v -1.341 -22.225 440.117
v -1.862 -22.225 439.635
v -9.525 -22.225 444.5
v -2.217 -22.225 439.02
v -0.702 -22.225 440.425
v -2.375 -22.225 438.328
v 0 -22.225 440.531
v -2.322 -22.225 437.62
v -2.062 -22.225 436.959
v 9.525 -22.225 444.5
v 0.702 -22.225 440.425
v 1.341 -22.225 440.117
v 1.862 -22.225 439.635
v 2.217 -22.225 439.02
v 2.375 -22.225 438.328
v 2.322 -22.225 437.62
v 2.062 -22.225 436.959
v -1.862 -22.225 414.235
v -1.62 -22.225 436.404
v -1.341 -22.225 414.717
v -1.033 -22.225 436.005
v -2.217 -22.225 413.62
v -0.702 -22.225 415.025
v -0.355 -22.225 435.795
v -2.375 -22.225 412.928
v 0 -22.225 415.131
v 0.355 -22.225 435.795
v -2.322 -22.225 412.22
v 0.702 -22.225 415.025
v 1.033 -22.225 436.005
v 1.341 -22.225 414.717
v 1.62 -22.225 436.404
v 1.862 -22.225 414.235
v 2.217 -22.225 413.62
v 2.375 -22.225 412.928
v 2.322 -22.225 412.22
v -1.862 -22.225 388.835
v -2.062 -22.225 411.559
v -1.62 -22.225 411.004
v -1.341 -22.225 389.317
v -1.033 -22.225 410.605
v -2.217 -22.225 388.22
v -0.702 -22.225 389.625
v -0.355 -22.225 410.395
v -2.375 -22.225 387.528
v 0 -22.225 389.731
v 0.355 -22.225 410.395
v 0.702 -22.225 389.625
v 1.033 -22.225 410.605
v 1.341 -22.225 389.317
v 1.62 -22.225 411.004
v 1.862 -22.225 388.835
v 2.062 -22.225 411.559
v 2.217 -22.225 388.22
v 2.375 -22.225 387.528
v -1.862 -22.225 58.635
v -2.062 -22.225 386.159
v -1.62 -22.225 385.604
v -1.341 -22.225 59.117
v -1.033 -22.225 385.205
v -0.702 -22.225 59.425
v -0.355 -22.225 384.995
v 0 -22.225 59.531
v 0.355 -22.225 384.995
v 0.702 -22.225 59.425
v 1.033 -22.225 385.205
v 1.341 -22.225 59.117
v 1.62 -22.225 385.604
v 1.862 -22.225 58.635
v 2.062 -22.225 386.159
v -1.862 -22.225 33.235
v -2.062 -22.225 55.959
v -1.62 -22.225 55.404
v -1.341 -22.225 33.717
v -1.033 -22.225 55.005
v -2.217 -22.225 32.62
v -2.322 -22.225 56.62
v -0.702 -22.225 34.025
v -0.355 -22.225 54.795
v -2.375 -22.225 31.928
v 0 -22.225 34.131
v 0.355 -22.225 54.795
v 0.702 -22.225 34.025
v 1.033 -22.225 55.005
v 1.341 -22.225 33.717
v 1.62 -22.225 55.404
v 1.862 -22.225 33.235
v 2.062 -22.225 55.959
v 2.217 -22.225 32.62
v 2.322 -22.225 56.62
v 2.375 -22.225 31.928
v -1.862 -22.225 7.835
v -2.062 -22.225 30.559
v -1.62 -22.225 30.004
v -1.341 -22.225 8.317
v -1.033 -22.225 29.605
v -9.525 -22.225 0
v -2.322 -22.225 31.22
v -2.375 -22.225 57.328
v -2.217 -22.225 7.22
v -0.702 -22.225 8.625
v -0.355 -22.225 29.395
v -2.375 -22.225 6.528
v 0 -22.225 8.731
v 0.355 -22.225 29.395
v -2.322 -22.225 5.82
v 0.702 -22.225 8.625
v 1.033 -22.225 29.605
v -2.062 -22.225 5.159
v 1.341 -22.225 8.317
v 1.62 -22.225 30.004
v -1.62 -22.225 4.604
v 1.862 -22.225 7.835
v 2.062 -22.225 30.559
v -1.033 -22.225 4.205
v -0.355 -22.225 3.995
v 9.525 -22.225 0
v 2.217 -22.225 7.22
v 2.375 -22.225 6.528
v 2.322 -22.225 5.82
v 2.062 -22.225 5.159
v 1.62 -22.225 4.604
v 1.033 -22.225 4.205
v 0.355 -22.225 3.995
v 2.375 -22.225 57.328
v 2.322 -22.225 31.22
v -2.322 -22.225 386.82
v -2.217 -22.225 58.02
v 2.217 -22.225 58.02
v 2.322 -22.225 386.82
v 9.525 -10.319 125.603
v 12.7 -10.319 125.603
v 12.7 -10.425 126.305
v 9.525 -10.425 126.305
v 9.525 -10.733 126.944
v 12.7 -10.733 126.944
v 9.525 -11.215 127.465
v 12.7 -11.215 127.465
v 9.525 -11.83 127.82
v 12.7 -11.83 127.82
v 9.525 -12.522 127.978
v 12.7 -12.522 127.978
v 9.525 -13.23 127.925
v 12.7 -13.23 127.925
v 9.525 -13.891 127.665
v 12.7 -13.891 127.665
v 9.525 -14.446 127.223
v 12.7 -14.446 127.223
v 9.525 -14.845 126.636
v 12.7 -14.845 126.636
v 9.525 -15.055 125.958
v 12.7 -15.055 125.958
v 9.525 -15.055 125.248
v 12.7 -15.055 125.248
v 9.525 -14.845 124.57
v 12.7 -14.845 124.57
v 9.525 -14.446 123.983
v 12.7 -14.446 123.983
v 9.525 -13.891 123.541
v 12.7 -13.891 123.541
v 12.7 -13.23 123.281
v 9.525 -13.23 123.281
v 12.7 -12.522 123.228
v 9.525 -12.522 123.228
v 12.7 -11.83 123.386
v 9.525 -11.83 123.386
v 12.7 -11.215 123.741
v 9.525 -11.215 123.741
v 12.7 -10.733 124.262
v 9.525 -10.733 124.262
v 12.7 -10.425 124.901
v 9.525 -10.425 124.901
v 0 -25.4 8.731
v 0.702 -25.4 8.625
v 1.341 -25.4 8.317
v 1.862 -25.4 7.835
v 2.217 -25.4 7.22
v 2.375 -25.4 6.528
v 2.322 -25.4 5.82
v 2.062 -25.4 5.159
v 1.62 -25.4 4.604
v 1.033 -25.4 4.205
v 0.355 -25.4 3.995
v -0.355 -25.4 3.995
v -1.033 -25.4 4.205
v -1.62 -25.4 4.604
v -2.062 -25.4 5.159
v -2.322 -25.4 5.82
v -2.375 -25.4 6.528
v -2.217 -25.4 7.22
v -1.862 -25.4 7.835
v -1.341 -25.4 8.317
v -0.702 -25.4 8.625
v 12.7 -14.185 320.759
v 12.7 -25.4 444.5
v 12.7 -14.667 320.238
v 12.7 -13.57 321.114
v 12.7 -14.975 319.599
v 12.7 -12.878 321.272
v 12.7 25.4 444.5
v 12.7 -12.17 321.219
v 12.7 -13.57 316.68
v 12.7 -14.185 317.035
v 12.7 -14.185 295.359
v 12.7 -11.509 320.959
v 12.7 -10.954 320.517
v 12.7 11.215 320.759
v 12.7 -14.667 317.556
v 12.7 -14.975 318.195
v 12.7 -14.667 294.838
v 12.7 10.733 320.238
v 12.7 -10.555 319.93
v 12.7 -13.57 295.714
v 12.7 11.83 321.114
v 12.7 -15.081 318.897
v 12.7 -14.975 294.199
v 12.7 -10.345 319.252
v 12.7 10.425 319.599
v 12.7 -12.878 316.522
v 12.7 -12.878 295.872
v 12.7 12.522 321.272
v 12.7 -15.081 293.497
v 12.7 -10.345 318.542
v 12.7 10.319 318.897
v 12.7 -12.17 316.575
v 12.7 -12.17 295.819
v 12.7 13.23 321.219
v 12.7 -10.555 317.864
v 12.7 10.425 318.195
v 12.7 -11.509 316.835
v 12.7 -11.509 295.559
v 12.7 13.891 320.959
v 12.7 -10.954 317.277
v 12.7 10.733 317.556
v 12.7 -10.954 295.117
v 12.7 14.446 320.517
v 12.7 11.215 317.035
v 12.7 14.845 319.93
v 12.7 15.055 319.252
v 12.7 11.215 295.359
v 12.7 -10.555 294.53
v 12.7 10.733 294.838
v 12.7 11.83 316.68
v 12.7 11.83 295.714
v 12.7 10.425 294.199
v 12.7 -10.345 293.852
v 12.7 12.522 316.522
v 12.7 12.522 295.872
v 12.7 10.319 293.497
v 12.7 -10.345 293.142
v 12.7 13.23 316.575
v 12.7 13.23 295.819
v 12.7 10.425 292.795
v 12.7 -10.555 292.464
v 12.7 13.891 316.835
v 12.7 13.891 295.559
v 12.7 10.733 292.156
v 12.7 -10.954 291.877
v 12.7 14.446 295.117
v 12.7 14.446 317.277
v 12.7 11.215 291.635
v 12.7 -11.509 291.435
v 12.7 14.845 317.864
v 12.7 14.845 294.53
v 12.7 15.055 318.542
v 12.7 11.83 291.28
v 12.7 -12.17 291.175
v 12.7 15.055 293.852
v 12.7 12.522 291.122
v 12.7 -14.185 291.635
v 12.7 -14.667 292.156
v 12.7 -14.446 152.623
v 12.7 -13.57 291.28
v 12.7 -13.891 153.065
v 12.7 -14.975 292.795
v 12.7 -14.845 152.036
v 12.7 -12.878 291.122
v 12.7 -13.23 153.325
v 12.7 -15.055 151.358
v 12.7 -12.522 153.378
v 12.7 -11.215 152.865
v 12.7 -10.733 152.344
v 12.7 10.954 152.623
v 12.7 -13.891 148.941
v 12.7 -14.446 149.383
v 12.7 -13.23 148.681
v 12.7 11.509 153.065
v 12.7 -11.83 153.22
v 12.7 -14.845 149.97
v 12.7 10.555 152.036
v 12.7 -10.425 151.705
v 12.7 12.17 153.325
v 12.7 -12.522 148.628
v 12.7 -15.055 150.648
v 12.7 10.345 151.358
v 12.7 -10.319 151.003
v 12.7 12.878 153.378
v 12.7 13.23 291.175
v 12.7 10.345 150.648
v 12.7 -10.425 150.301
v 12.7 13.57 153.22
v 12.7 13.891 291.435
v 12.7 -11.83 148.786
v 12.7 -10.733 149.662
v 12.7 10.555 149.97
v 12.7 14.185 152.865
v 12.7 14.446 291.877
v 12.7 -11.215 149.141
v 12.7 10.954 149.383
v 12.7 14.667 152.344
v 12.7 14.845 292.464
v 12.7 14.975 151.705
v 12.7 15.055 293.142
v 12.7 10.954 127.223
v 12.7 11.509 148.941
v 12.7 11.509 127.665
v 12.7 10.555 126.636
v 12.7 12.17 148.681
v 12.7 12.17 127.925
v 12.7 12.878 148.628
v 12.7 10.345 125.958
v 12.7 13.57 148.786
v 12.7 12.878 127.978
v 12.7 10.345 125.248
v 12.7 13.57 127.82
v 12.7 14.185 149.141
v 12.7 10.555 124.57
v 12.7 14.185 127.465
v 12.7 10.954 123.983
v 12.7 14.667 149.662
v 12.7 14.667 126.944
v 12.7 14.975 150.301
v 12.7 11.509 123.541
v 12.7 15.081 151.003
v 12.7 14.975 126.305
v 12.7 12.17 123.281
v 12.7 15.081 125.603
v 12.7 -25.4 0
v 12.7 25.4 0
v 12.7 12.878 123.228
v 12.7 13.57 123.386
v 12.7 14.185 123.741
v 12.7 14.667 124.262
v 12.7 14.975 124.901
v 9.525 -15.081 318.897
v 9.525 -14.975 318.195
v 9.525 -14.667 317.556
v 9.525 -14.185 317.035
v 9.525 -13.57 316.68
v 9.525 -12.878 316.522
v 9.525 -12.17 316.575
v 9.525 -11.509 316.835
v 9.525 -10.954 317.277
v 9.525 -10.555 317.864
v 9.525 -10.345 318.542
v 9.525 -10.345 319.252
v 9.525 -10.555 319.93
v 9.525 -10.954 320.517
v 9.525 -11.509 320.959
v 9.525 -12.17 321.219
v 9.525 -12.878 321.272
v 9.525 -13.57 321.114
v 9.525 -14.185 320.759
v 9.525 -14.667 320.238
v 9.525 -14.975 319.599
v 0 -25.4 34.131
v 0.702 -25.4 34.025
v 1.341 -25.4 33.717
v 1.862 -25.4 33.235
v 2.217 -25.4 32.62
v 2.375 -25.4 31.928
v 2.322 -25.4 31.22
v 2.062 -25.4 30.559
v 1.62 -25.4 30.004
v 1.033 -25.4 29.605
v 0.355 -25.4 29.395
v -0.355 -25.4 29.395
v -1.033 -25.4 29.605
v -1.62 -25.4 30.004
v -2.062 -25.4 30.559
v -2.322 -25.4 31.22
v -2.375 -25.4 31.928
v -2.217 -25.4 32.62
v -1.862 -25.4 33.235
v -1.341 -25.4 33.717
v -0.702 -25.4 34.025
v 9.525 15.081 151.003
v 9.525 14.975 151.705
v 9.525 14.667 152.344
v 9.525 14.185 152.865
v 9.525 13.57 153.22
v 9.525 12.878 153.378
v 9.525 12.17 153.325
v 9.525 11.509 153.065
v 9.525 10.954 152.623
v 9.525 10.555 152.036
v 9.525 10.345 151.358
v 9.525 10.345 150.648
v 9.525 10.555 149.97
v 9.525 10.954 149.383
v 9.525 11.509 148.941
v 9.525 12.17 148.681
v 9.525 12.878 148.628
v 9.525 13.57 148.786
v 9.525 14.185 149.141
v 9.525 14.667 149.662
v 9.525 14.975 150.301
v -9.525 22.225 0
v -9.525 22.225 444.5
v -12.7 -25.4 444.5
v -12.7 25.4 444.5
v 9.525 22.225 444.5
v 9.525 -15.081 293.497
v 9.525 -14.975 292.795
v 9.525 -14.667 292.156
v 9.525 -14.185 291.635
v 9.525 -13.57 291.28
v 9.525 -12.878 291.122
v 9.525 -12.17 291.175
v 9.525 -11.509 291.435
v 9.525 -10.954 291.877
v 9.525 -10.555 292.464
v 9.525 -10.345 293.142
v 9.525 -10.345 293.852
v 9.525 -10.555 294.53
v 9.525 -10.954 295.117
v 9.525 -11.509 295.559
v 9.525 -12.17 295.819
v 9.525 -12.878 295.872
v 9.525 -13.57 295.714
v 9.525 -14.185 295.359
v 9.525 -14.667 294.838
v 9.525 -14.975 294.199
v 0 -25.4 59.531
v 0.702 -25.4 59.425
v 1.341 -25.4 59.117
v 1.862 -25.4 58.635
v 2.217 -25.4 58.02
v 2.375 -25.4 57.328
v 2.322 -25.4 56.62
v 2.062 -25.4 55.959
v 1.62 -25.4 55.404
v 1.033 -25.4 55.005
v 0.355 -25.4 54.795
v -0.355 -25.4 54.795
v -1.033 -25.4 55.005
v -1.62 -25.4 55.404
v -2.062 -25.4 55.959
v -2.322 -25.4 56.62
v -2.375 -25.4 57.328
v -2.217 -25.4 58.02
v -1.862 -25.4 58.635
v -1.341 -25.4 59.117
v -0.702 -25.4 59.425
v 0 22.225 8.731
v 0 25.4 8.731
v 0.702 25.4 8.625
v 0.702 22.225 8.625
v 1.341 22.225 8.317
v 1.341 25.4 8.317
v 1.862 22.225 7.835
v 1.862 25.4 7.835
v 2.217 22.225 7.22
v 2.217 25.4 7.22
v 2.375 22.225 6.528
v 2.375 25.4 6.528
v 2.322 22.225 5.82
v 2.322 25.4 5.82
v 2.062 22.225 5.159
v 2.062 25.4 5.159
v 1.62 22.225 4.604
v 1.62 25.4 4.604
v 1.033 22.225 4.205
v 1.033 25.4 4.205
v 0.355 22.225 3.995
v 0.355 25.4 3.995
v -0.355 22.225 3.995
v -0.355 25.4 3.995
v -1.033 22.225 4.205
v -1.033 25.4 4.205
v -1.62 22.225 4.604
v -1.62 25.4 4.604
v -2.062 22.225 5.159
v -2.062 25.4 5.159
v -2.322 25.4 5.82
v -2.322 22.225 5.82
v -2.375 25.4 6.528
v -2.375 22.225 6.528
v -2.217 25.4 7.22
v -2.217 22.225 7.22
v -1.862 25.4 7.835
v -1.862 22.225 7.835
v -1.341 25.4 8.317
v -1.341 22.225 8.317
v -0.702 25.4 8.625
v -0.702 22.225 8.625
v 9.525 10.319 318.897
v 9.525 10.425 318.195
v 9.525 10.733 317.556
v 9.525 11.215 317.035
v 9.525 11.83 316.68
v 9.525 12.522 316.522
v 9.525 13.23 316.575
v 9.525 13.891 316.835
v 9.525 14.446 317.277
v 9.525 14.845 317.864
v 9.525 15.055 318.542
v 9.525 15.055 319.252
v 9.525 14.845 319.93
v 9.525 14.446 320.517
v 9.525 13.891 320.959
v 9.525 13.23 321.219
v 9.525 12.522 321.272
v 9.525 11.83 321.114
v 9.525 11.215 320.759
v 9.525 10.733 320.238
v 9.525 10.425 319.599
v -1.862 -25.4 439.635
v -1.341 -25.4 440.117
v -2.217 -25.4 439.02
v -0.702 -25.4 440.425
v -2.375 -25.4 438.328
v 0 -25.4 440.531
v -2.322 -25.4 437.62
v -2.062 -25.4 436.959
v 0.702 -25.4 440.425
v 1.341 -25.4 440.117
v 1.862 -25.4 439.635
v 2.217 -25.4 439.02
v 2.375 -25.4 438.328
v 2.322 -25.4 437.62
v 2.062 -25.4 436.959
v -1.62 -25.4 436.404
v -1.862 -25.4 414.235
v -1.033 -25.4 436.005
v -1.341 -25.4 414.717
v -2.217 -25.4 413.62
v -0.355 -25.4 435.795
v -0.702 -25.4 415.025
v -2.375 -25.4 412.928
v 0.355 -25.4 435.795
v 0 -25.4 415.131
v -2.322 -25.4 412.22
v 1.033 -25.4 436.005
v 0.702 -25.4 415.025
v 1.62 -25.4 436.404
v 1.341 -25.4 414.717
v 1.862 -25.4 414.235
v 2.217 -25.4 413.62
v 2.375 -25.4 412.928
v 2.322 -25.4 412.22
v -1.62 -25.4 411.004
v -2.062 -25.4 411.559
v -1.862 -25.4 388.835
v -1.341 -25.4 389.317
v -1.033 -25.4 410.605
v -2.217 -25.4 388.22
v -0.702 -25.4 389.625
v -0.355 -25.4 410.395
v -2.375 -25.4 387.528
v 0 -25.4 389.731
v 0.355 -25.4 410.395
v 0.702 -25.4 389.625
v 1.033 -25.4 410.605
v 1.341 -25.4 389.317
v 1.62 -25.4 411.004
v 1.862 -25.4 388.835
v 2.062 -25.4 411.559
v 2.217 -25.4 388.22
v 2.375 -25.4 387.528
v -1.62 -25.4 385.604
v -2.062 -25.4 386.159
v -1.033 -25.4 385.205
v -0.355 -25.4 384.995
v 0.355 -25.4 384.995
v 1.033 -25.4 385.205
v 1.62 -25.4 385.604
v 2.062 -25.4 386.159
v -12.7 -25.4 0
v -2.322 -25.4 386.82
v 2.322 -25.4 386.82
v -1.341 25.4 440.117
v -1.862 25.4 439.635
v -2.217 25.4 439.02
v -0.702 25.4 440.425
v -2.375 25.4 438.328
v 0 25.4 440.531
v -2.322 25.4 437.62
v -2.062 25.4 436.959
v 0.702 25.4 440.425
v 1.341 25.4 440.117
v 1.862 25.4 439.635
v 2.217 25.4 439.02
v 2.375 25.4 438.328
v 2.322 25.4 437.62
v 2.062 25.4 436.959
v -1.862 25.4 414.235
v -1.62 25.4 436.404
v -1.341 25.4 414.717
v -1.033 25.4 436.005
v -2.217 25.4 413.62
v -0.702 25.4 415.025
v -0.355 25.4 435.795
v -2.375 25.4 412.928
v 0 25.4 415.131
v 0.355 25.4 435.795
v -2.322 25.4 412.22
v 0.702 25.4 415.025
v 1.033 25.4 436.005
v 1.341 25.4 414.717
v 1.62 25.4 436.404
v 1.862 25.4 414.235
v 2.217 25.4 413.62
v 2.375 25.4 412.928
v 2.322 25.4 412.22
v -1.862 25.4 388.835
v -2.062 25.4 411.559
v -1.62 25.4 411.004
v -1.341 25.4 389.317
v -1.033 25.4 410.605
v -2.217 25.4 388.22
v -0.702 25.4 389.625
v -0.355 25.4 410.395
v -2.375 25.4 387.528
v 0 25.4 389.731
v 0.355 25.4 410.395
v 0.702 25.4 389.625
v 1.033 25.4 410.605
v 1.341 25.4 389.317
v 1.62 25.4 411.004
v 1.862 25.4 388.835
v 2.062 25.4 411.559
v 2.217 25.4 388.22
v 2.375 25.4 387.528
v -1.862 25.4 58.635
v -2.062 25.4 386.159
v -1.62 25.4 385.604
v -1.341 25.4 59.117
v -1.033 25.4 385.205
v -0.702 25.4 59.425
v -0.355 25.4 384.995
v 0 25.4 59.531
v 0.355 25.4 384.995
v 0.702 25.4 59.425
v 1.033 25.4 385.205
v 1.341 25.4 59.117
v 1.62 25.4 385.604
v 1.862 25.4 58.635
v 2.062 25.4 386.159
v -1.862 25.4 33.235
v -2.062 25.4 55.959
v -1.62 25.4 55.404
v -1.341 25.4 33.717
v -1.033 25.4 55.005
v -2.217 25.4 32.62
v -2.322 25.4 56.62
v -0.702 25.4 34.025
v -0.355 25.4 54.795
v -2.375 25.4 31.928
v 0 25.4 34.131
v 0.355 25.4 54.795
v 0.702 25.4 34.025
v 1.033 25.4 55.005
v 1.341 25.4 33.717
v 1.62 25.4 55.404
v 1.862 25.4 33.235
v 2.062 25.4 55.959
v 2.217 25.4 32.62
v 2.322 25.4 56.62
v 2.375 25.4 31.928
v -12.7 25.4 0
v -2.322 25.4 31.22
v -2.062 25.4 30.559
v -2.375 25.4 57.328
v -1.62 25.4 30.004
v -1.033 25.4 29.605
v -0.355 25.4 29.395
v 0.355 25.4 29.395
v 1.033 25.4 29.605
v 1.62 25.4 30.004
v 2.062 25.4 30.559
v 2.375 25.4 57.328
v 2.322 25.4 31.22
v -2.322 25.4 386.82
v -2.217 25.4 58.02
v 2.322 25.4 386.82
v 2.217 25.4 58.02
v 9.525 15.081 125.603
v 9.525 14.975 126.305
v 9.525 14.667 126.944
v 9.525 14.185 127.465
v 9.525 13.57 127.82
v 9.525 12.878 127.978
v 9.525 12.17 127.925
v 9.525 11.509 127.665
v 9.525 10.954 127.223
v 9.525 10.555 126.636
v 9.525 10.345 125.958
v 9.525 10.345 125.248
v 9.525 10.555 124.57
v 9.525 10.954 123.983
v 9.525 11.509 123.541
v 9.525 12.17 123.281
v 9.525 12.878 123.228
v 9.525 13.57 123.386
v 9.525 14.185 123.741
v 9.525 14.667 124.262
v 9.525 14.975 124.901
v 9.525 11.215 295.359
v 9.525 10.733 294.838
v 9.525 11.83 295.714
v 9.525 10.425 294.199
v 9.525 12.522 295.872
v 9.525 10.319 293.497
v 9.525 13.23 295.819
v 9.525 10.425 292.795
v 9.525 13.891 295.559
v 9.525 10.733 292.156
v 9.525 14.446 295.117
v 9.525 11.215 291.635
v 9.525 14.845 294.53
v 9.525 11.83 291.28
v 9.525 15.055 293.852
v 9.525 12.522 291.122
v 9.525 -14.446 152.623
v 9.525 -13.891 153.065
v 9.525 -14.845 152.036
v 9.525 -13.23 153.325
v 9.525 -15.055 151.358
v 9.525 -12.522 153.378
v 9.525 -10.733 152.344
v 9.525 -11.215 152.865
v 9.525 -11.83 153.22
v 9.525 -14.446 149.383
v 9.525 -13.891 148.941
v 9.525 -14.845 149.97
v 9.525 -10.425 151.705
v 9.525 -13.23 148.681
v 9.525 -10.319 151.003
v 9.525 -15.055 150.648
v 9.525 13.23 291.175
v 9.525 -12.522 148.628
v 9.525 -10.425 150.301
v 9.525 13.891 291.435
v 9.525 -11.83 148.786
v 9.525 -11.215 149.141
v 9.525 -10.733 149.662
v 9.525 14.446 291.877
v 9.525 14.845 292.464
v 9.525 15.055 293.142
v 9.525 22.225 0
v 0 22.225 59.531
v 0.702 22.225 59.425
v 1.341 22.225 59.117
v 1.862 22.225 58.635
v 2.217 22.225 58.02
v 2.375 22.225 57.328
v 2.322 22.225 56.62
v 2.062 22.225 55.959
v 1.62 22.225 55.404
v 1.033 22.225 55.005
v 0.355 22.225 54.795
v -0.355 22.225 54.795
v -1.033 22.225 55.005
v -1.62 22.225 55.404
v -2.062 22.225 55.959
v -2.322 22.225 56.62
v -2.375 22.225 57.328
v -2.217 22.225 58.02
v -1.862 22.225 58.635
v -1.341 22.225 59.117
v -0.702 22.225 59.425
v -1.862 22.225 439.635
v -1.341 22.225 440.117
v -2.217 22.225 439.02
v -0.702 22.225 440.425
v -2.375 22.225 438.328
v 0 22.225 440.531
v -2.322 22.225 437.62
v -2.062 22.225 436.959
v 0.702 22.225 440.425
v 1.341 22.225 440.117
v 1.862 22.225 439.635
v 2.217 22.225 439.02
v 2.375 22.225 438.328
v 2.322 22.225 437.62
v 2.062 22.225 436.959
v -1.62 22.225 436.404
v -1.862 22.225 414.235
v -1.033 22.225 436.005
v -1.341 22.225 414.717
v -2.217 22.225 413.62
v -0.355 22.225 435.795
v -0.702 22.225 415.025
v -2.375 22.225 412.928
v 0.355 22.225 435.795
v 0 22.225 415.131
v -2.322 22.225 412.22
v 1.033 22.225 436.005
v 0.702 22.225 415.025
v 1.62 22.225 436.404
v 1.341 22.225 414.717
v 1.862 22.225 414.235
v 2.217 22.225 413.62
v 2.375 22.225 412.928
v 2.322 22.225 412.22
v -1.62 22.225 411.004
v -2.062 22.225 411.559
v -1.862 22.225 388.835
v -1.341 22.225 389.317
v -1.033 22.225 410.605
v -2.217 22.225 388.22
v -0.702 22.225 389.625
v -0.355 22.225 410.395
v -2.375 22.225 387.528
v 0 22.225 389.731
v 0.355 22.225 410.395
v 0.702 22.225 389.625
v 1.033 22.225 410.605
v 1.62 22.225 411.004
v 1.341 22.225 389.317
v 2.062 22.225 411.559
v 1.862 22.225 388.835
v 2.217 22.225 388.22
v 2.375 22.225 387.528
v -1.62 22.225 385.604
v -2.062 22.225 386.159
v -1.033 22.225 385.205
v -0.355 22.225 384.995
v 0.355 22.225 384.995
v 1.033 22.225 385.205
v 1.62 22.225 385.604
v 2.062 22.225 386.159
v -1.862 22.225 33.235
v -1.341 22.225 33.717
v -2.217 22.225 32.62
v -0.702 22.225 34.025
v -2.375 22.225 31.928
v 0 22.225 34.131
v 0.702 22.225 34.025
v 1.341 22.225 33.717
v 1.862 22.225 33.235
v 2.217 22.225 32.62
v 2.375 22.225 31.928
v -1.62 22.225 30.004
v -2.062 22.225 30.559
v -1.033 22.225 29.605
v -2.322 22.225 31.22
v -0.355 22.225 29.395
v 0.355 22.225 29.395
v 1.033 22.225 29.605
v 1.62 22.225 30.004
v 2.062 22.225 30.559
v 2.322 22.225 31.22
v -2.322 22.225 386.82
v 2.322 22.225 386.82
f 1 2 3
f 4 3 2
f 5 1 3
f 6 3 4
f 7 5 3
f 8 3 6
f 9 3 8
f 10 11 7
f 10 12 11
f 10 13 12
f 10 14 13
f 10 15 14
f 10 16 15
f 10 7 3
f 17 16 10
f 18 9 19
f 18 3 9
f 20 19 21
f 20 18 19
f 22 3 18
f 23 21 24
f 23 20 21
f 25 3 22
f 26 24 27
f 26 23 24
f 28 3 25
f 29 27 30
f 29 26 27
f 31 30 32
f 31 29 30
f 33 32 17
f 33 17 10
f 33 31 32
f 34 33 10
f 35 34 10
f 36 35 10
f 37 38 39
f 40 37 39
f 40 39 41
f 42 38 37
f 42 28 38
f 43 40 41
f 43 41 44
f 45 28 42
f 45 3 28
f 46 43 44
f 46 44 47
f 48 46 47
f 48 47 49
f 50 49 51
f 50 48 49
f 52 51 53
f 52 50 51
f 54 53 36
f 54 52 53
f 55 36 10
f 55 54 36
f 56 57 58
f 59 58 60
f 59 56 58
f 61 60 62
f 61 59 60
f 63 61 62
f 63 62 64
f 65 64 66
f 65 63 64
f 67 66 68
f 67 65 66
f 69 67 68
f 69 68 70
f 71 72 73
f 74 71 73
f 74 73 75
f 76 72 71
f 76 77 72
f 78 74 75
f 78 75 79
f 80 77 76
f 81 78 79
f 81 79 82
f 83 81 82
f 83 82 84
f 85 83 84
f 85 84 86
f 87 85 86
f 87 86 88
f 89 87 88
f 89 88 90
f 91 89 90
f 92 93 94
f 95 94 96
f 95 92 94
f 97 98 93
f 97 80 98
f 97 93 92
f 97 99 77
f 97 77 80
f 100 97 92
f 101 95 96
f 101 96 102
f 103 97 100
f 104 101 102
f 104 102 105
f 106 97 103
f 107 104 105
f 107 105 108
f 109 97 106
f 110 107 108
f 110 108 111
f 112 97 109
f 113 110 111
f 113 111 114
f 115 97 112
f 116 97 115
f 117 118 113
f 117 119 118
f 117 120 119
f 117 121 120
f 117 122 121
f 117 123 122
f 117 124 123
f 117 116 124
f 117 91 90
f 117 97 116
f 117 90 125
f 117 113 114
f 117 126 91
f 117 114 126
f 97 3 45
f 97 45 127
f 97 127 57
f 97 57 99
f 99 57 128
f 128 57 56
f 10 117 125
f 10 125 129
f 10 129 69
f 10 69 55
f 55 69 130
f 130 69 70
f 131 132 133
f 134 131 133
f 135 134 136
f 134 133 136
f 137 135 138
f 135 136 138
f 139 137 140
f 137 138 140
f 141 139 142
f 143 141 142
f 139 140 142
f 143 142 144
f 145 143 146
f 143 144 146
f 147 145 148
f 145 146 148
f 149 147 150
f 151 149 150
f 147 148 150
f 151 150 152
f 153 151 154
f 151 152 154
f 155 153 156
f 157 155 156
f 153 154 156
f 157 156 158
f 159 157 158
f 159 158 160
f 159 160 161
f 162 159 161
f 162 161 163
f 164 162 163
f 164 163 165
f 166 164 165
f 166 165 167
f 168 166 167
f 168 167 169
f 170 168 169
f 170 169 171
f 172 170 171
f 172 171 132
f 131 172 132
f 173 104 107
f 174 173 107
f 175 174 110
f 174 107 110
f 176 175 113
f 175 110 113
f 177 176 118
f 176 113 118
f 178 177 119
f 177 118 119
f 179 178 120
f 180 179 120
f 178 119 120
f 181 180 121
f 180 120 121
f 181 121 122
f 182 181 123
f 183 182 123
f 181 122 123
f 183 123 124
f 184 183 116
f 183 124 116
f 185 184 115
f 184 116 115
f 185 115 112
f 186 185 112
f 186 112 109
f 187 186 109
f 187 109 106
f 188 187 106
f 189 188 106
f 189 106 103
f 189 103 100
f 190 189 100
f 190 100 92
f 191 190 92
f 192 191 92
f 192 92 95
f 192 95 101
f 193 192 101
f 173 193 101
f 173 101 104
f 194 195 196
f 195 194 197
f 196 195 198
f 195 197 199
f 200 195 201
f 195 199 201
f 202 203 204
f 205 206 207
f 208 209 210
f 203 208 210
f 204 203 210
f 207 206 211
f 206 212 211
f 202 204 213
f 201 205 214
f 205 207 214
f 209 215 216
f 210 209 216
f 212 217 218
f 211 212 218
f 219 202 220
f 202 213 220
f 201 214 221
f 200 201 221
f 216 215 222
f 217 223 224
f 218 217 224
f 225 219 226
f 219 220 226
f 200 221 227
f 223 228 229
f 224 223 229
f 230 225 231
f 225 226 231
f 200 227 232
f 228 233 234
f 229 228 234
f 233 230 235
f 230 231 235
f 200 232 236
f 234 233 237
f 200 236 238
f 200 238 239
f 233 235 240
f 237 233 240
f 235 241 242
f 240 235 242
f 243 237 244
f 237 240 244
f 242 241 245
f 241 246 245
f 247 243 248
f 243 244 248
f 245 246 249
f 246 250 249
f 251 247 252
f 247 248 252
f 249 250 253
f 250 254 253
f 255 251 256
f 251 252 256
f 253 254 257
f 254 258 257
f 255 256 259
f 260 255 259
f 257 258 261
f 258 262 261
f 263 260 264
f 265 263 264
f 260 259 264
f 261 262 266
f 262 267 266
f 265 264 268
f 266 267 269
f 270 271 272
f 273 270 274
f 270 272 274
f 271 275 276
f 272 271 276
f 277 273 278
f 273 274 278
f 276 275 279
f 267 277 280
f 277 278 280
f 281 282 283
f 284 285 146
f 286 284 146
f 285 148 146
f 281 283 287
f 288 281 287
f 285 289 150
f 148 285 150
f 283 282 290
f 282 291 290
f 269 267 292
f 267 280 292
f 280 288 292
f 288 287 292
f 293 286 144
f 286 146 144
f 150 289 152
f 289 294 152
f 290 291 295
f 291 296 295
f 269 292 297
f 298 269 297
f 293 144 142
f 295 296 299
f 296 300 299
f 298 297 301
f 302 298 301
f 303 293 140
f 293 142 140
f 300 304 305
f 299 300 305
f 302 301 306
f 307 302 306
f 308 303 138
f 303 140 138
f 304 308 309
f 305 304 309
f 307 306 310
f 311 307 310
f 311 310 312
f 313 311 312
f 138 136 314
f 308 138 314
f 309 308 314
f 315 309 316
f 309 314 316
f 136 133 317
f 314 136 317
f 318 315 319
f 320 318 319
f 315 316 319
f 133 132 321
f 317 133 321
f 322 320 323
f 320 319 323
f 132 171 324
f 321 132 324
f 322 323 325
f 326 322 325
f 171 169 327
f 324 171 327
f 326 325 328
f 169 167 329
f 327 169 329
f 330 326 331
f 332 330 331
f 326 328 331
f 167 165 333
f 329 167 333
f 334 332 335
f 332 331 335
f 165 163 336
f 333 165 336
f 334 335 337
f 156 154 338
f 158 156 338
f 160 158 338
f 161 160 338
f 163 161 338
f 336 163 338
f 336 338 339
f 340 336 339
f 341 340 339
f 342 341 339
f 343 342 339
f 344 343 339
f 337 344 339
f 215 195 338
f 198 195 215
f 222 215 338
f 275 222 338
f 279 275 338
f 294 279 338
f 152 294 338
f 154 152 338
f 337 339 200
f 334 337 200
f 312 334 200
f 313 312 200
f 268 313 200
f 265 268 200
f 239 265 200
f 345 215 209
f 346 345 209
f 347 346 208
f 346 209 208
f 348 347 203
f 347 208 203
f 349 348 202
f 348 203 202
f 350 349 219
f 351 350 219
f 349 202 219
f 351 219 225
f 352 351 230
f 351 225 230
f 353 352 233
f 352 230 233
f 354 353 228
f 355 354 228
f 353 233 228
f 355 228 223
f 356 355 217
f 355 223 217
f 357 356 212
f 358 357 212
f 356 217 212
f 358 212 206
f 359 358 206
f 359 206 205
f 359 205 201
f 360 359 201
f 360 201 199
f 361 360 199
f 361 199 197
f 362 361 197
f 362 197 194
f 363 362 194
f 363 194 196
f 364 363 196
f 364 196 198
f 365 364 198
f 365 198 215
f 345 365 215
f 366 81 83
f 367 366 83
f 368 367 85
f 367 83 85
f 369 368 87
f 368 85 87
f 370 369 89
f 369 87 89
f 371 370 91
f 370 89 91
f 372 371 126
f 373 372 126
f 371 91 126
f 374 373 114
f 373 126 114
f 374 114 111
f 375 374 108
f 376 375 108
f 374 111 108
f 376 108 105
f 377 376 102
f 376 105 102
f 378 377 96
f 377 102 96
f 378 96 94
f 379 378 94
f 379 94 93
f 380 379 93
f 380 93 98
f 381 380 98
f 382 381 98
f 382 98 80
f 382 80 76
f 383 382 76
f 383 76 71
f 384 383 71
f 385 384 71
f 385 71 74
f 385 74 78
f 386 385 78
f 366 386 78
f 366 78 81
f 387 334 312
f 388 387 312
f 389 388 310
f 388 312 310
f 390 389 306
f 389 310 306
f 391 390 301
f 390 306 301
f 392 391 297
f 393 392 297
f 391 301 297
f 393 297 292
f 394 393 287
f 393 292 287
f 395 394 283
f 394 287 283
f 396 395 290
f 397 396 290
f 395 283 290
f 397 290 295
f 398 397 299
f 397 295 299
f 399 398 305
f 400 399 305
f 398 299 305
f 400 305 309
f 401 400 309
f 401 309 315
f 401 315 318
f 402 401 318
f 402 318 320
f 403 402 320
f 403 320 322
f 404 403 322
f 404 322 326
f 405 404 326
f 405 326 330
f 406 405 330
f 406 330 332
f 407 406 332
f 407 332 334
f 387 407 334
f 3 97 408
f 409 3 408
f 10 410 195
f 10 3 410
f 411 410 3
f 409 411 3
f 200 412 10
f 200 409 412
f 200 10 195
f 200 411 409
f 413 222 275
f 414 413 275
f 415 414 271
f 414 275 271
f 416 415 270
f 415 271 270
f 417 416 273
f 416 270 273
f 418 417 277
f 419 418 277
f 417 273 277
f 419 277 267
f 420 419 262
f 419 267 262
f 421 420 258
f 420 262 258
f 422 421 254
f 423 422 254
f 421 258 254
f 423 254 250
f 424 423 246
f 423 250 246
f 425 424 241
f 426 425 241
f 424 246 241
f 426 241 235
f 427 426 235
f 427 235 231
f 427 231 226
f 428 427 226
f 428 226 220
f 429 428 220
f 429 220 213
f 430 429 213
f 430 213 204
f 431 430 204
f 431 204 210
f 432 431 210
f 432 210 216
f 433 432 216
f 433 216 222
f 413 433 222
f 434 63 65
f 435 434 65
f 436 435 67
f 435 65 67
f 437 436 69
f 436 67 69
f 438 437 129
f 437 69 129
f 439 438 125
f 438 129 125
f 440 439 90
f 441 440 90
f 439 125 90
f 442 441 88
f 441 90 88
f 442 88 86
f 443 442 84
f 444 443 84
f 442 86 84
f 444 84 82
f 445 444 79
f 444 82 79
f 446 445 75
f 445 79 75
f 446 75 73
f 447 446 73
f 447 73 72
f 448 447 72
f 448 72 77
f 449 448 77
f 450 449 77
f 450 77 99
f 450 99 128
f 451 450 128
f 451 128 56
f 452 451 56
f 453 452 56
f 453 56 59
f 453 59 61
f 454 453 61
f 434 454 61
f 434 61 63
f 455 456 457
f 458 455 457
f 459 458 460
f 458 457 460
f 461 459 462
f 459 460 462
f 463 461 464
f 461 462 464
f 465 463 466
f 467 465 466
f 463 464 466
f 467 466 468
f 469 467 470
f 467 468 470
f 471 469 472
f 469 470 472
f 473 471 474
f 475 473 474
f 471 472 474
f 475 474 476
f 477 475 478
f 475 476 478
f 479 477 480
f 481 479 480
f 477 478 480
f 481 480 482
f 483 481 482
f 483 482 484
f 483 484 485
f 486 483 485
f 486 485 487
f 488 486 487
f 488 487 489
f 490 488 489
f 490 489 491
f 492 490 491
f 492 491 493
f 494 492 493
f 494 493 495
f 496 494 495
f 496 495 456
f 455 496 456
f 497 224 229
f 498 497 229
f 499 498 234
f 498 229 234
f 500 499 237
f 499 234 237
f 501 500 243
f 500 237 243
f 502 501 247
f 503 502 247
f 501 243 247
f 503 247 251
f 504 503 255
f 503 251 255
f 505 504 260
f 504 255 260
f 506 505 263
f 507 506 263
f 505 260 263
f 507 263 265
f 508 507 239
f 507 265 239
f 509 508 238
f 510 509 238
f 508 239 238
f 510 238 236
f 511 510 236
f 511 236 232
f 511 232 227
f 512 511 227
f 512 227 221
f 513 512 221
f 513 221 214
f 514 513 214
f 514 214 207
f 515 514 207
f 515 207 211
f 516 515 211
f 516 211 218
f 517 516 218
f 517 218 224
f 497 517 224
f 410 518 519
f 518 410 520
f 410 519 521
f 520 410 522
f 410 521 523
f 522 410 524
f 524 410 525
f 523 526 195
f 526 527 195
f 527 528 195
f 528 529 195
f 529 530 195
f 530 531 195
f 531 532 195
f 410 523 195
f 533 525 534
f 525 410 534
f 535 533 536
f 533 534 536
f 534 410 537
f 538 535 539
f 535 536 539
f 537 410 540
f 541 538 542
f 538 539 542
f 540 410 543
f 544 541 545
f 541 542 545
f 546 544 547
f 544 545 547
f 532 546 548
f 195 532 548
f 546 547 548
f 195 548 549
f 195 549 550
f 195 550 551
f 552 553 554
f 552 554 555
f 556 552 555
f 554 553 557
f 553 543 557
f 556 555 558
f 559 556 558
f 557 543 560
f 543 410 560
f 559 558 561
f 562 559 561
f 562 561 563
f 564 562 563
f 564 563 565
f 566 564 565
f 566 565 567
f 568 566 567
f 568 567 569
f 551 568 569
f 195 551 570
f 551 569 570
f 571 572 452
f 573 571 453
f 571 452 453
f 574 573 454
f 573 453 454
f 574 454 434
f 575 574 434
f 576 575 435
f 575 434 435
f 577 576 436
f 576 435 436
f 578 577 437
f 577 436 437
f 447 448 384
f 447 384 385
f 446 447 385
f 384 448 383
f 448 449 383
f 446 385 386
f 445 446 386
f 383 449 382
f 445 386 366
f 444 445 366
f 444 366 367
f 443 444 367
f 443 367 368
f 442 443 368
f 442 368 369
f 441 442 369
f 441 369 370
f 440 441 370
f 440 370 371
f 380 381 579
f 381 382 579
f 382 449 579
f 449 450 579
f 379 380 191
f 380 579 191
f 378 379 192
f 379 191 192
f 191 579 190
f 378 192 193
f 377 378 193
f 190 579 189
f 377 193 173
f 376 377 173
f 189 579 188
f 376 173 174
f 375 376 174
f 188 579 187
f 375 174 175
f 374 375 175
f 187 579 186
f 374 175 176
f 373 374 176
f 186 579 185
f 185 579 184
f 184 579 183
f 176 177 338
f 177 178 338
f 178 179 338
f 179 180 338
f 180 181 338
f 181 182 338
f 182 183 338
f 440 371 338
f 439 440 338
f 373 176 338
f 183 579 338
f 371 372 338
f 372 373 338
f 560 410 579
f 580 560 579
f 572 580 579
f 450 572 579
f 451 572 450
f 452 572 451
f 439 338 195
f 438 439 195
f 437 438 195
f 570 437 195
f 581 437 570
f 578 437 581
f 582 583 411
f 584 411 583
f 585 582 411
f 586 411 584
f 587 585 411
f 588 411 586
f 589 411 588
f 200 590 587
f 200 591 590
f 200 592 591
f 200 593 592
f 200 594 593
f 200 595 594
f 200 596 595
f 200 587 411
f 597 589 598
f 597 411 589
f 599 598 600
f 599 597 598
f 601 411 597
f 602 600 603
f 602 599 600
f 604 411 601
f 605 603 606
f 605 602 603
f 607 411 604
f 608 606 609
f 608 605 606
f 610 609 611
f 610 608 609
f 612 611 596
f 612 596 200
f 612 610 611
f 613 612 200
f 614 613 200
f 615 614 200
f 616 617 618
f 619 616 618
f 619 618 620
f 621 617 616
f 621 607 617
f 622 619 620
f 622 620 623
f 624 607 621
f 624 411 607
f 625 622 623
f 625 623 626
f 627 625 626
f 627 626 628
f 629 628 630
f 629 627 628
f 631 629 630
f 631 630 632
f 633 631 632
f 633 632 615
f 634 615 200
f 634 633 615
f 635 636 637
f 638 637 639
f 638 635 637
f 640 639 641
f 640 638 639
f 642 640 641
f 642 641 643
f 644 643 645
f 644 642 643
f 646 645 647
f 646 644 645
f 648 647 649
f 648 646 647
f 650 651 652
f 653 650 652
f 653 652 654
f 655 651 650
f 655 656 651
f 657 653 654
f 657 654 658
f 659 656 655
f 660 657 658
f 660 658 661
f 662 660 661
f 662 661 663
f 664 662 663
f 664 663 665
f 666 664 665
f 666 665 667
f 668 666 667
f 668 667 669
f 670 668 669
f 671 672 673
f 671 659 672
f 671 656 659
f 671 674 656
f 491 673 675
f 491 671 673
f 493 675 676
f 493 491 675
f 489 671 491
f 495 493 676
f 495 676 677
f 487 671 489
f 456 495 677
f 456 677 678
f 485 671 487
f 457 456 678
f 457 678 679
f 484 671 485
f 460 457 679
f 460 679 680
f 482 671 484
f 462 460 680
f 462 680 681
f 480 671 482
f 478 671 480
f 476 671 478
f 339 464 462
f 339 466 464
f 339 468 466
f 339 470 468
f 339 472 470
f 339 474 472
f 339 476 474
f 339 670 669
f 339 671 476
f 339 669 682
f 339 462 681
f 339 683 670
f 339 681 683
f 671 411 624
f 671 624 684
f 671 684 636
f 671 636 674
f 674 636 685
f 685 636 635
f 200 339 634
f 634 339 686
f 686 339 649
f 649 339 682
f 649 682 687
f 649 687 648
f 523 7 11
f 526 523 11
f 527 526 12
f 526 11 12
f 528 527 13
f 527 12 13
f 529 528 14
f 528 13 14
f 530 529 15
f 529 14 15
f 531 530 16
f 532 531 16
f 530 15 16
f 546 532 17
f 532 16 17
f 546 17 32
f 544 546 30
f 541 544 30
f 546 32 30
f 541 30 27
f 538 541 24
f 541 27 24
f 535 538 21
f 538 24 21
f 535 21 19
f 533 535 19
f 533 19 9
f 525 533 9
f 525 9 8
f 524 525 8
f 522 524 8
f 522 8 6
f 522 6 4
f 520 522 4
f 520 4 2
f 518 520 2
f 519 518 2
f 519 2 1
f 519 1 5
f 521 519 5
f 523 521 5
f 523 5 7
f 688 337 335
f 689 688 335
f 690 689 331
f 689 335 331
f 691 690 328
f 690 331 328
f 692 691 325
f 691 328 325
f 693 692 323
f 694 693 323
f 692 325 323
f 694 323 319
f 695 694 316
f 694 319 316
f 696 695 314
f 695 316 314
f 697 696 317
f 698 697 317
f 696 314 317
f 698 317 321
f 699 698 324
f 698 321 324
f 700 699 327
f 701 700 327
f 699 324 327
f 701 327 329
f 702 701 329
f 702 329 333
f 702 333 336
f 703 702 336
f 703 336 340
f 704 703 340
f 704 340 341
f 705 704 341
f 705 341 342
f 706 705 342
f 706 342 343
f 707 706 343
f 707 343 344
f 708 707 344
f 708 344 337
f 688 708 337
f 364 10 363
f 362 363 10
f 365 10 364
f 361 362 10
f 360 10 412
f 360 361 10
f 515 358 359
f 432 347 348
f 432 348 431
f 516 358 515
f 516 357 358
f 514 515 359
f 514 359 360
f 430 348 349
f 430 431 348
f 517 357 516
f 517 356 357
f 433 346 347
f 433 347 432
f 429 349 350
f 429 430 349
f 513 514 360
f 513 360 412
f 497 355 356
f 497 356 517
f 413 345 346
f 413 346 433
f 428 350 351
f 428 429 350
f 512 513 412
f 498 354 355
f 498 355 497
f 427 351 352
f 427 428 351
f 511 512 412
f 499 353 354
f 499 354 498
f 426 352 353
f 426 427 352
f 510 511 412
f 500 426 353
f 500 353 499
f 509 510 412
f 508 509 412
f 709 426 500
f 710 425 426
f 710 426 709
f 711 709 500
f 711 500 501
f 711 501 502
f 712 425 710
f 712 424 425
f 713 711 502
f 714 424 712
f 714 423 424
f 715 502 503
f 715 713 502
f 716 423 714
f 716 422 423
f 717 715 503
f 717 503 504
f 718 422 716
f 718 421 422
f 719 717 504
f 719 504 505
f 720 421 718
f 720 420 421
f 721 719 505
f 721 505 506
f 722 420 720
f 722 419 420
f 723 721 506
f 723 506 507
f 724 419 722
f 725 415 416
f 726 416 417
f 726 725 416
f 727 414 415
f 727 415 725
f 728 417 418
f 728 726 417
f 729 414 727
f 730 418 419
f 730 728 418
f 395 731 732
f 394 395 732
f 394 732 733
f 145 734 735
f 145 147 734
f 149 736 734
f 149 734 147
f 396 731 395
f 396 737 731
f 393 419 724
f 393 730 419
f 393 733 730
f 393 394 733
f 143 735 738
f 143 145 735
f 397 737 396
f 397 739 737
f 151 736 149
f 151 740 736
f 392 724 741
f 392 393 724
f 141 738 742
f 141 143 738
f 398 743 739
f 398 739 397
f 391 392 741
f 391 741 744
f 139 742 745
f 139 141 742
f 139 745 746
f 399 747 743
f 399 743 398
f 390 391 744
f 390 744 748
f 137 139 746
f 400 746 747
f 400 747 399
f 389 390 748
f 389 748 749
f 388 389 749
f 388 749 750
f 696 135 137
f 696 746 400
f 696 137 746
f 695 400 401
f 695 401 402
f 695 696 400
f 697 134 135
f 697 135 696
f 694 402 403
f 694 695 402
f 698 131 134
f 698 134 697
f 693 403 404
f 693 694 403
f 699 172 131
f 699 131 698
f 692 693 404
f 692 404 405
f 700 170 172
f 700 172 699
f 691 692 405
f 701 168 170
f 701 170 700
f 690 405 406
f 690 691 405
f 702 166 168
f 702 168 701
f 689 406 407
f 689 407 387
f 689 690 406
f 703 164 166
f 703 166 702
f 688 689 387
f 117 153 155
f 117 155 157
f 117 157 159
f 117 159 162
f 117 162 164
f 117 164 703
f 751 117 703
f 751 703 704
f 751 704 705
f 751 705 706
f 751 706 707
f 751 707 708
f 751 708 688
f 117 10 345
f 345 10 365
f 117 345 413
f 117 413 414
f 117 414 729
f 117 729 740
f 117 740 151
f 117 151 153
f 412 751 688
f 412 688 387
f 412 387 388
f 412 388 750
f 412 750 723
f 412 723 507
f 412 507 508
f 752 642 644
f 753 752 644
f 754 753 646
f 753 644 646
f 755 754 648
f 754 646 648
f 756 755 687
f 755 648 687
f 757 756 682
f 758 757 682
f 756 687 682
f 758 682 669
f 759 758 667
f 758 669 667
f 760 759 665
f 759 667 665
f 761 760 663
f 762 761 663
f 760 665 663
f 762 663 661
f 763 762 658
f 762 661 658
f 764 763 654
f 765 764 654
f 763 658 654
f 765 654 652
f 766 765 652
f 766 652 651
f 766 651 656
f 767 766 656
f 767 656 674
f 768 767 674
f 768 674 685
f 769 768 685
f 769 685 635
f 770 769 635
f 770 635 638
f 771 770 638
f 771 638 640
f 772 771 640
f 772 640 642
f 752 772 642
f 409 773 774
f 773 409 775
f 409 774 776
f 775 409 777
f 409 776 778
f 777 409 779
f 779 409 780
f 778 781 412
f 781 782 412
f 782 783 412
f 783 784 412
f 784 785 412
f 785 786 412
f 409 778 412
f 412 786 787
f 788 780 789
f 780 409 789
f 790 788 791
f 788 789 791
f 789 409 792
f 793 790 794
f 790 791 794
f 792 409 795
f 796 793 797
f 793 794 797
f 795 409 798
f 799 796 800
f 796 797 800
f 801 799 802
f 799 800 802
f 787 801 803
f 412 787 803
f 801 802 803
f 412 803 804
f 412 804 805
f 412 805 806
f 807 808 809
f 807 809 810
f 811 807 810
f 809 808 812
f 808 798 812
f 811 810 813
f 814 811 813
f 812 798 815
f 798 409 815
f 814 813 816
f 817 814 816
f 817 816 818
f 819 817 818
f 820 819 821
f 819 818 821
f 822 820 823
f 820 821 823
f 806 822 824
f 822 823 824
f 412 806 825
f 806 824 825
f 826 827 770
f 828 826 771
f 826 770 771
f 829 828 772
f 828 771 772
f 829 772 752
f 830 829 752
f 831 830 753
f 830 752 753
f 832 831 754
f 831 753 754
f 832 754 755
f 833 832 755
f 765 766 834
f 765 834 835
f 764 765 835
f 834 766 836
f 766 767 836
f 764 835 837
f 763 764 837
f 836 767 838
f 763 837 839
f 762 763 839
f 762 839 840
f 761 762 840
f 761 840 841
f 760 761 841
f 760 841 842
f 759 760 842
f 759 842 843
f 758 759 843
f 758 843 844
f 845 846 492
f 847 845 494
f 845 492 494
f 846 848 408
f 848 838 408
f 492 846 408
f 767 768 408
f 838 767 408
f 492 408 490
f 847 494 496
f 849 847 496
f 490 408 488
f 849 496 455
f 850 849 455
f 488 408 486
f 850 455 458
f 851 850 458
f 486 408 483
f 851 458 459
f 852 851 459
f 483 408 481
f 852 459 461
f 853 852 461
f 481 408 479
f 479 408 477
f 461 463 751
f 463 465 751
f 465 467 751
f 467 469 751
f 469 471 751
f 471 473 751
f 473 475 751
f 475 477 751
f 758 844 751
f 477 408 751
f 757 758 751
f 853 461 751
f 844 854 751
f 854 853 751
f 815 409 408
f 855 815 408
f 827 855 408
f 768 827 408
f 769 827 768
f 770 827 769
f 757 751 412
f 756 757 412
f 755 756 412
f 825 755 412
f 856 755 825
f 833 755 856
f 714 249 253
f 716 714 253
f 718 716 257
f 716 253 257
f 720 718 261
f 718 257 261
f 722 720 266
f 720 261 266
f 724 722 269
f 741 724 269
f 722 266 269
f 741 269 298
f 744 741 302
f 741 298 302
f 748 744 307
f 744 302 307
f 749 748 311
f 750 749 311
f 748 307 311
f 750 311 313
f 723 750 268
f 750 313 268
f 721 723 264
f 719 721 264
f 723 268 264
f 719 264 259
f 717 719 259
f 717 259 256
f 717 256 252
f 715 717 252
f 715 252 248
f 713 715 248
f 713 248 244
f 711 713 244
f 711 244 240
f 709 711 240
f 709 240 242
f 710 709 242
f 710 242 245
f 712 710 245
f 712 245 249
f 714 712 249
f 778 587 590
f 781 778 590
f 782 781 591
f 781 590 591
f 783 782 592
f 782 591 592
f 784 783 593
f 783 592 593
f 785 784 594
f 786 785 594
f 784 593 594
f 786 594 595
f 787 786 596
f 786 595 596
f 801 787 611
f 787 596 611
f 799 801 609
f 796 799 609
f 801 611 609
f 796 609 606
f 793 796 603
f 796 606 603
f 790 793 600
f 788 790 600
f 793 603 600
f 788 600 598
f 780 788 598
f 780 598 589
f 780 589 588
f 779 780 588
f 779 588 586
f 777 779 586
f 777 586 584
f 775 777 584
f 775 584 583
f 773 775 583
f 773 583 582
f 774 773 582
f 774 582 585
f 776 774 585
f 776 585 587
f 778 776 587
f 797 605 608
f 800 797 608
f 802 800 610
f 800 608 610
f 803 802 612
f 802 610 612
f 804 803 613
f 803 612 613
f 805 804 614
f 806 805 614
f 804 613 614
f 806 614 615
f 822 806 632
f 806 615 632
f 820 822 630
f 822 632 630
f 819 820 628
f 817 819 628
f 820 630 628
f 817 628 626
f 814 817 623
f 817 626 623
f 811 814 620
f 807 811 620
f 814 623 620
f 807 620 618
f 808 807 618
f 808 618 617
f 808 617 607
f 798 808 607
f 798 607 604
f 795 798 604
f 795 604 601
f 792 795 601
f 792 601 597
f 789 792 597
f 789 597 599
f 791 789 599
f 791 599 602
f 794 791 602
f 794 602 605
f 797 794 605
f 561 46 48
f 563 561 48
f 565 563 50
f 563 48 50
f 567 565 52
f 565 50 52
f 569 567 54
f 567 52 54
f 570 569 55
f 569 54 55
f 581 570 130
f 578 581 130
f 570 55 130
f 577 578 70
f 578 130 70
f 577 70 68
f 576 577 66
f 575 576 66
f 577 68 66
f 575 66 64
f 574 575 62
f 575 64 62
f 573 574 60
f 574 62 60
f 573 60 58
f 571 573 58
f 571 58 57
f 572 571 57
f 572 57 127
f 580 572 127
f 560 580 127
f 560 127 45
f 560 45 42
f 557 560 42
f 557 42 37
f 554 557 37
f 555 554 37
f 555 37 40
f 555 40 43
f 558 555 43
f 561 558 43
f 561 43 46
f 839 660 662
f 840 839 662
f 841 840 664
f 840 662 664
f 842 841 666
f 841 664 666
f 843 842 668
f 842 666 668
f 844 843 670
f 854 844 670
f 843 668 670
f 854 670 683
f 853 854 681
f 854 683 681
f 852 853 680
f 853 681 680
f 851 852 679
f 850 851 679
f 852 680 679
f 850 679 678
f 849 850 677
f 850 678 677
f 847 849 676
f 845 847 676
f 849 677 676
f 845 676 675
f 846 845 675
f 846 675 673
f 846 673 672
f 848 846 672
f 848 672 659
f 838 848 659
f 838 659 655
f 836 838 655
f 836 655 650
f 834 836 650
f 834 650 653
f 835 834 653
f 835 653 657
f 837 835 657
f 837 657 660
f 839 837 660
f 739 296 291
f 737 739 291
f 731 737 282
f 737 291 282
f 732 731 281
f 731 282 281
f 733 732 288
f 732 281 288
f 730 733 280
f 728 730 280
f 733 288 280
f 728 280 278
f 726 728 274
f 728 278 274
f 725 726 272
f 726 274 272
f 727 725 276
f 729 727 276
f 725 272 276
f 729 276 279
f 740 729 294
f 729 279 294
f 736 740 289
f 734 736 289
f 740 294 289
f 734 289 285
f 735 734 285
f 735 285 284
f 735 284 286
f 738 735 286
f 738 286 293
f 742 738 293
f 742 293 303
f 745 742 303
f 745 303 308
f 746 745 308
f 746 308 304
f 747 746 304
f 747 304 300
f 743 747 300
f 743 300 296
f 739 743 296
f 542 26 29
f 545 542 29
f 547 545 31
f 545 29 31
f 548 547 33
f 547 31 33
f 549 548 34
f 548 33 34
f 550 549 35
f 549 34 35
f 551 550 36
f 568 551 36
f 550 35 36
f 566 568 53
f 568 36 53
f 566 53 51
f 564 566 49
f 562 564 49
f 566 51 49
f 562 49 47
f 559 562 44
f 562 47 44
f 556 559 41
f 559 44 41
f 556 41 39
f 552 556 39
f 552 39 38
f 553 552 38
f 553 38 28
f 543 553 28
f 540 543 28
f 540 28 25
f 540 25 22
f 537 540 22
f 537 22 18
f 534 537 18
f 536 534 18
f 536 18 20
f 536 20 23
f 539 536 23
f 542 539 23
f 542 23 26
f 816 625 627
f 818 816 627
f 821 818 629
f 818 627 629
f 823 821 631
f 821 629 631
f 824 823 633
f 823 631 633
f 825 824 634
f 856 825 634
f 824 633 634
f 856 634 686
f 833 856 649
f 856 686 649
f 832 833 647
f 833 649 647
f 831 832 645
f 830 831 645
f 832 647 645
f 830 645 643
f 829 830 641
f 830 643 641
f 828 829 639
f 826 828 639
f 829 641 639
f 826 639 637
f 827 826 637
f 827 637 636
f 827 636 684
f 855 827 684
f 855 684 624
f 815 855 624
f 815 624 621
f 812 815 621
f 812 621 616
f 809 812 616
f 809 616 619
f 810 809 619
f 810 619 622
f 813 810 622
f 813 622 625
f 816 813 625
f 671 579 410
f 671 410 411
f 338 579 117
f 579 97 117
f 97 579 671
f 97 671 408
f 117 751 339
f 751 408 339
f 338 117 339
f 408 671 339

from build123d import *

# Parameters (mm, degrees)
SKETCH1_W           = 25.4
SKETCH1_H           = 50.8
BOSS_EXTRUDE1_DEPTH = 444.5
SHELL1_T            = -3.175
SKETCH2_R           = 2.38125
CUT_EXTRUDE1_DEPTH  = 448.573658742
SKETCH3_R           = 2.38125
CUT_EXTRUDE2_DEPTH  = 6.35


with BuildPart() as part:
    # Sketch1 → Boss-Extrude1 (new body)
    with BuildSketch(Plane.XY):
        Rectangle(SKETCH1_W, SKETCH1_H)
    extrude(amount=BOSS_EXTRUDE1_DEPTH)

    # Shell1
    shell1_openings = [part.faces().sort_by_distance(p)[0] for p in [
        (0, 0, 444.5),
        (0, 0, 0),
    ]]
    offset(amount=SHELL1_T, openings=shell1_openings, kind=Kind.INTERSECTION)

    # Sketch2 → Cut-Extrude1 (cut, through all)
    with BuildSketch(Plane(origin=(0, 25.4, 0), x_dir=(1, 0, 0), z_dir=(0, 1, 0))):
        with Locations(Location((0, -6.35, 0), (0, 0, 270))):
            Circle(SKETCH2_R)
        with Locations(Location((0, -31.75, 0), (0, 0, 270))):
            Circle(SKETCH2_R)
        with Locations(Location((0, -57.15, 0), (0, 0, 270))):
            Circle(SKETCH2_R)
        with Locations(Location((0, -387.35, 0), (0, 0, 270))):
            Circle(SKETCH2_R)
        with Locations(Location((0, -412.75, 0), (0, 0, 270))):
            Circle(SKETCH2_R)
        with Locations(Location((0, -438.15, 0), (0, 0, 270))):
            Circle(SKETCH2_R)
    extrude(amount=-CUT_EXTRUDE1_DEPTH, mode=Mode.SUBTRACT)

    # Sketch3 → Cut-Extrude2 (cut)
    with BuildSketch(Plane(origin=(12.7, 0, 0), x_dir=(0, 0, -1), z_dir=(1, 0, 0))):
        with Locations(Location((-125.603, -12.7, 0), (0, 0, 90))):
            Circle(SKETCH3_R)
        with Locations(Location((-125.603, 12.7, 0), (0, 0, 90))):
            Circle(SKETCH3_R)
        with Locations(Location((-151.003, 12.7, 0), (0, 0, 90))):
            Circle(SKETCH3_R)
        with Locations(Location((-151.003, -12.7, 0), (0, 0, 90))):
            Circle(SKETCH3_R)
        with Locations(Location((-293.497, -12.7, 0), (0, 0, 270))):
            Circle(SKETCH3_R)
        with Locations(Location((-293.497, 12.7, 0), (0, 0, 270))):
            Circle(SKETCH3_R)
        with Locations(Location((-318.897, 12.7, 0), (0, 0, 270))):
            Circle(SKETCH3_R)
        with Locations(Location((-318.897, -12.7, 0), (0, 0, 270))):
            Circle(SKETCH3_R)
    extrude(amount=-CUT_EXTRUDE2_DEPTH, mode=Mode.SUBTRACT)


solid = part.part
